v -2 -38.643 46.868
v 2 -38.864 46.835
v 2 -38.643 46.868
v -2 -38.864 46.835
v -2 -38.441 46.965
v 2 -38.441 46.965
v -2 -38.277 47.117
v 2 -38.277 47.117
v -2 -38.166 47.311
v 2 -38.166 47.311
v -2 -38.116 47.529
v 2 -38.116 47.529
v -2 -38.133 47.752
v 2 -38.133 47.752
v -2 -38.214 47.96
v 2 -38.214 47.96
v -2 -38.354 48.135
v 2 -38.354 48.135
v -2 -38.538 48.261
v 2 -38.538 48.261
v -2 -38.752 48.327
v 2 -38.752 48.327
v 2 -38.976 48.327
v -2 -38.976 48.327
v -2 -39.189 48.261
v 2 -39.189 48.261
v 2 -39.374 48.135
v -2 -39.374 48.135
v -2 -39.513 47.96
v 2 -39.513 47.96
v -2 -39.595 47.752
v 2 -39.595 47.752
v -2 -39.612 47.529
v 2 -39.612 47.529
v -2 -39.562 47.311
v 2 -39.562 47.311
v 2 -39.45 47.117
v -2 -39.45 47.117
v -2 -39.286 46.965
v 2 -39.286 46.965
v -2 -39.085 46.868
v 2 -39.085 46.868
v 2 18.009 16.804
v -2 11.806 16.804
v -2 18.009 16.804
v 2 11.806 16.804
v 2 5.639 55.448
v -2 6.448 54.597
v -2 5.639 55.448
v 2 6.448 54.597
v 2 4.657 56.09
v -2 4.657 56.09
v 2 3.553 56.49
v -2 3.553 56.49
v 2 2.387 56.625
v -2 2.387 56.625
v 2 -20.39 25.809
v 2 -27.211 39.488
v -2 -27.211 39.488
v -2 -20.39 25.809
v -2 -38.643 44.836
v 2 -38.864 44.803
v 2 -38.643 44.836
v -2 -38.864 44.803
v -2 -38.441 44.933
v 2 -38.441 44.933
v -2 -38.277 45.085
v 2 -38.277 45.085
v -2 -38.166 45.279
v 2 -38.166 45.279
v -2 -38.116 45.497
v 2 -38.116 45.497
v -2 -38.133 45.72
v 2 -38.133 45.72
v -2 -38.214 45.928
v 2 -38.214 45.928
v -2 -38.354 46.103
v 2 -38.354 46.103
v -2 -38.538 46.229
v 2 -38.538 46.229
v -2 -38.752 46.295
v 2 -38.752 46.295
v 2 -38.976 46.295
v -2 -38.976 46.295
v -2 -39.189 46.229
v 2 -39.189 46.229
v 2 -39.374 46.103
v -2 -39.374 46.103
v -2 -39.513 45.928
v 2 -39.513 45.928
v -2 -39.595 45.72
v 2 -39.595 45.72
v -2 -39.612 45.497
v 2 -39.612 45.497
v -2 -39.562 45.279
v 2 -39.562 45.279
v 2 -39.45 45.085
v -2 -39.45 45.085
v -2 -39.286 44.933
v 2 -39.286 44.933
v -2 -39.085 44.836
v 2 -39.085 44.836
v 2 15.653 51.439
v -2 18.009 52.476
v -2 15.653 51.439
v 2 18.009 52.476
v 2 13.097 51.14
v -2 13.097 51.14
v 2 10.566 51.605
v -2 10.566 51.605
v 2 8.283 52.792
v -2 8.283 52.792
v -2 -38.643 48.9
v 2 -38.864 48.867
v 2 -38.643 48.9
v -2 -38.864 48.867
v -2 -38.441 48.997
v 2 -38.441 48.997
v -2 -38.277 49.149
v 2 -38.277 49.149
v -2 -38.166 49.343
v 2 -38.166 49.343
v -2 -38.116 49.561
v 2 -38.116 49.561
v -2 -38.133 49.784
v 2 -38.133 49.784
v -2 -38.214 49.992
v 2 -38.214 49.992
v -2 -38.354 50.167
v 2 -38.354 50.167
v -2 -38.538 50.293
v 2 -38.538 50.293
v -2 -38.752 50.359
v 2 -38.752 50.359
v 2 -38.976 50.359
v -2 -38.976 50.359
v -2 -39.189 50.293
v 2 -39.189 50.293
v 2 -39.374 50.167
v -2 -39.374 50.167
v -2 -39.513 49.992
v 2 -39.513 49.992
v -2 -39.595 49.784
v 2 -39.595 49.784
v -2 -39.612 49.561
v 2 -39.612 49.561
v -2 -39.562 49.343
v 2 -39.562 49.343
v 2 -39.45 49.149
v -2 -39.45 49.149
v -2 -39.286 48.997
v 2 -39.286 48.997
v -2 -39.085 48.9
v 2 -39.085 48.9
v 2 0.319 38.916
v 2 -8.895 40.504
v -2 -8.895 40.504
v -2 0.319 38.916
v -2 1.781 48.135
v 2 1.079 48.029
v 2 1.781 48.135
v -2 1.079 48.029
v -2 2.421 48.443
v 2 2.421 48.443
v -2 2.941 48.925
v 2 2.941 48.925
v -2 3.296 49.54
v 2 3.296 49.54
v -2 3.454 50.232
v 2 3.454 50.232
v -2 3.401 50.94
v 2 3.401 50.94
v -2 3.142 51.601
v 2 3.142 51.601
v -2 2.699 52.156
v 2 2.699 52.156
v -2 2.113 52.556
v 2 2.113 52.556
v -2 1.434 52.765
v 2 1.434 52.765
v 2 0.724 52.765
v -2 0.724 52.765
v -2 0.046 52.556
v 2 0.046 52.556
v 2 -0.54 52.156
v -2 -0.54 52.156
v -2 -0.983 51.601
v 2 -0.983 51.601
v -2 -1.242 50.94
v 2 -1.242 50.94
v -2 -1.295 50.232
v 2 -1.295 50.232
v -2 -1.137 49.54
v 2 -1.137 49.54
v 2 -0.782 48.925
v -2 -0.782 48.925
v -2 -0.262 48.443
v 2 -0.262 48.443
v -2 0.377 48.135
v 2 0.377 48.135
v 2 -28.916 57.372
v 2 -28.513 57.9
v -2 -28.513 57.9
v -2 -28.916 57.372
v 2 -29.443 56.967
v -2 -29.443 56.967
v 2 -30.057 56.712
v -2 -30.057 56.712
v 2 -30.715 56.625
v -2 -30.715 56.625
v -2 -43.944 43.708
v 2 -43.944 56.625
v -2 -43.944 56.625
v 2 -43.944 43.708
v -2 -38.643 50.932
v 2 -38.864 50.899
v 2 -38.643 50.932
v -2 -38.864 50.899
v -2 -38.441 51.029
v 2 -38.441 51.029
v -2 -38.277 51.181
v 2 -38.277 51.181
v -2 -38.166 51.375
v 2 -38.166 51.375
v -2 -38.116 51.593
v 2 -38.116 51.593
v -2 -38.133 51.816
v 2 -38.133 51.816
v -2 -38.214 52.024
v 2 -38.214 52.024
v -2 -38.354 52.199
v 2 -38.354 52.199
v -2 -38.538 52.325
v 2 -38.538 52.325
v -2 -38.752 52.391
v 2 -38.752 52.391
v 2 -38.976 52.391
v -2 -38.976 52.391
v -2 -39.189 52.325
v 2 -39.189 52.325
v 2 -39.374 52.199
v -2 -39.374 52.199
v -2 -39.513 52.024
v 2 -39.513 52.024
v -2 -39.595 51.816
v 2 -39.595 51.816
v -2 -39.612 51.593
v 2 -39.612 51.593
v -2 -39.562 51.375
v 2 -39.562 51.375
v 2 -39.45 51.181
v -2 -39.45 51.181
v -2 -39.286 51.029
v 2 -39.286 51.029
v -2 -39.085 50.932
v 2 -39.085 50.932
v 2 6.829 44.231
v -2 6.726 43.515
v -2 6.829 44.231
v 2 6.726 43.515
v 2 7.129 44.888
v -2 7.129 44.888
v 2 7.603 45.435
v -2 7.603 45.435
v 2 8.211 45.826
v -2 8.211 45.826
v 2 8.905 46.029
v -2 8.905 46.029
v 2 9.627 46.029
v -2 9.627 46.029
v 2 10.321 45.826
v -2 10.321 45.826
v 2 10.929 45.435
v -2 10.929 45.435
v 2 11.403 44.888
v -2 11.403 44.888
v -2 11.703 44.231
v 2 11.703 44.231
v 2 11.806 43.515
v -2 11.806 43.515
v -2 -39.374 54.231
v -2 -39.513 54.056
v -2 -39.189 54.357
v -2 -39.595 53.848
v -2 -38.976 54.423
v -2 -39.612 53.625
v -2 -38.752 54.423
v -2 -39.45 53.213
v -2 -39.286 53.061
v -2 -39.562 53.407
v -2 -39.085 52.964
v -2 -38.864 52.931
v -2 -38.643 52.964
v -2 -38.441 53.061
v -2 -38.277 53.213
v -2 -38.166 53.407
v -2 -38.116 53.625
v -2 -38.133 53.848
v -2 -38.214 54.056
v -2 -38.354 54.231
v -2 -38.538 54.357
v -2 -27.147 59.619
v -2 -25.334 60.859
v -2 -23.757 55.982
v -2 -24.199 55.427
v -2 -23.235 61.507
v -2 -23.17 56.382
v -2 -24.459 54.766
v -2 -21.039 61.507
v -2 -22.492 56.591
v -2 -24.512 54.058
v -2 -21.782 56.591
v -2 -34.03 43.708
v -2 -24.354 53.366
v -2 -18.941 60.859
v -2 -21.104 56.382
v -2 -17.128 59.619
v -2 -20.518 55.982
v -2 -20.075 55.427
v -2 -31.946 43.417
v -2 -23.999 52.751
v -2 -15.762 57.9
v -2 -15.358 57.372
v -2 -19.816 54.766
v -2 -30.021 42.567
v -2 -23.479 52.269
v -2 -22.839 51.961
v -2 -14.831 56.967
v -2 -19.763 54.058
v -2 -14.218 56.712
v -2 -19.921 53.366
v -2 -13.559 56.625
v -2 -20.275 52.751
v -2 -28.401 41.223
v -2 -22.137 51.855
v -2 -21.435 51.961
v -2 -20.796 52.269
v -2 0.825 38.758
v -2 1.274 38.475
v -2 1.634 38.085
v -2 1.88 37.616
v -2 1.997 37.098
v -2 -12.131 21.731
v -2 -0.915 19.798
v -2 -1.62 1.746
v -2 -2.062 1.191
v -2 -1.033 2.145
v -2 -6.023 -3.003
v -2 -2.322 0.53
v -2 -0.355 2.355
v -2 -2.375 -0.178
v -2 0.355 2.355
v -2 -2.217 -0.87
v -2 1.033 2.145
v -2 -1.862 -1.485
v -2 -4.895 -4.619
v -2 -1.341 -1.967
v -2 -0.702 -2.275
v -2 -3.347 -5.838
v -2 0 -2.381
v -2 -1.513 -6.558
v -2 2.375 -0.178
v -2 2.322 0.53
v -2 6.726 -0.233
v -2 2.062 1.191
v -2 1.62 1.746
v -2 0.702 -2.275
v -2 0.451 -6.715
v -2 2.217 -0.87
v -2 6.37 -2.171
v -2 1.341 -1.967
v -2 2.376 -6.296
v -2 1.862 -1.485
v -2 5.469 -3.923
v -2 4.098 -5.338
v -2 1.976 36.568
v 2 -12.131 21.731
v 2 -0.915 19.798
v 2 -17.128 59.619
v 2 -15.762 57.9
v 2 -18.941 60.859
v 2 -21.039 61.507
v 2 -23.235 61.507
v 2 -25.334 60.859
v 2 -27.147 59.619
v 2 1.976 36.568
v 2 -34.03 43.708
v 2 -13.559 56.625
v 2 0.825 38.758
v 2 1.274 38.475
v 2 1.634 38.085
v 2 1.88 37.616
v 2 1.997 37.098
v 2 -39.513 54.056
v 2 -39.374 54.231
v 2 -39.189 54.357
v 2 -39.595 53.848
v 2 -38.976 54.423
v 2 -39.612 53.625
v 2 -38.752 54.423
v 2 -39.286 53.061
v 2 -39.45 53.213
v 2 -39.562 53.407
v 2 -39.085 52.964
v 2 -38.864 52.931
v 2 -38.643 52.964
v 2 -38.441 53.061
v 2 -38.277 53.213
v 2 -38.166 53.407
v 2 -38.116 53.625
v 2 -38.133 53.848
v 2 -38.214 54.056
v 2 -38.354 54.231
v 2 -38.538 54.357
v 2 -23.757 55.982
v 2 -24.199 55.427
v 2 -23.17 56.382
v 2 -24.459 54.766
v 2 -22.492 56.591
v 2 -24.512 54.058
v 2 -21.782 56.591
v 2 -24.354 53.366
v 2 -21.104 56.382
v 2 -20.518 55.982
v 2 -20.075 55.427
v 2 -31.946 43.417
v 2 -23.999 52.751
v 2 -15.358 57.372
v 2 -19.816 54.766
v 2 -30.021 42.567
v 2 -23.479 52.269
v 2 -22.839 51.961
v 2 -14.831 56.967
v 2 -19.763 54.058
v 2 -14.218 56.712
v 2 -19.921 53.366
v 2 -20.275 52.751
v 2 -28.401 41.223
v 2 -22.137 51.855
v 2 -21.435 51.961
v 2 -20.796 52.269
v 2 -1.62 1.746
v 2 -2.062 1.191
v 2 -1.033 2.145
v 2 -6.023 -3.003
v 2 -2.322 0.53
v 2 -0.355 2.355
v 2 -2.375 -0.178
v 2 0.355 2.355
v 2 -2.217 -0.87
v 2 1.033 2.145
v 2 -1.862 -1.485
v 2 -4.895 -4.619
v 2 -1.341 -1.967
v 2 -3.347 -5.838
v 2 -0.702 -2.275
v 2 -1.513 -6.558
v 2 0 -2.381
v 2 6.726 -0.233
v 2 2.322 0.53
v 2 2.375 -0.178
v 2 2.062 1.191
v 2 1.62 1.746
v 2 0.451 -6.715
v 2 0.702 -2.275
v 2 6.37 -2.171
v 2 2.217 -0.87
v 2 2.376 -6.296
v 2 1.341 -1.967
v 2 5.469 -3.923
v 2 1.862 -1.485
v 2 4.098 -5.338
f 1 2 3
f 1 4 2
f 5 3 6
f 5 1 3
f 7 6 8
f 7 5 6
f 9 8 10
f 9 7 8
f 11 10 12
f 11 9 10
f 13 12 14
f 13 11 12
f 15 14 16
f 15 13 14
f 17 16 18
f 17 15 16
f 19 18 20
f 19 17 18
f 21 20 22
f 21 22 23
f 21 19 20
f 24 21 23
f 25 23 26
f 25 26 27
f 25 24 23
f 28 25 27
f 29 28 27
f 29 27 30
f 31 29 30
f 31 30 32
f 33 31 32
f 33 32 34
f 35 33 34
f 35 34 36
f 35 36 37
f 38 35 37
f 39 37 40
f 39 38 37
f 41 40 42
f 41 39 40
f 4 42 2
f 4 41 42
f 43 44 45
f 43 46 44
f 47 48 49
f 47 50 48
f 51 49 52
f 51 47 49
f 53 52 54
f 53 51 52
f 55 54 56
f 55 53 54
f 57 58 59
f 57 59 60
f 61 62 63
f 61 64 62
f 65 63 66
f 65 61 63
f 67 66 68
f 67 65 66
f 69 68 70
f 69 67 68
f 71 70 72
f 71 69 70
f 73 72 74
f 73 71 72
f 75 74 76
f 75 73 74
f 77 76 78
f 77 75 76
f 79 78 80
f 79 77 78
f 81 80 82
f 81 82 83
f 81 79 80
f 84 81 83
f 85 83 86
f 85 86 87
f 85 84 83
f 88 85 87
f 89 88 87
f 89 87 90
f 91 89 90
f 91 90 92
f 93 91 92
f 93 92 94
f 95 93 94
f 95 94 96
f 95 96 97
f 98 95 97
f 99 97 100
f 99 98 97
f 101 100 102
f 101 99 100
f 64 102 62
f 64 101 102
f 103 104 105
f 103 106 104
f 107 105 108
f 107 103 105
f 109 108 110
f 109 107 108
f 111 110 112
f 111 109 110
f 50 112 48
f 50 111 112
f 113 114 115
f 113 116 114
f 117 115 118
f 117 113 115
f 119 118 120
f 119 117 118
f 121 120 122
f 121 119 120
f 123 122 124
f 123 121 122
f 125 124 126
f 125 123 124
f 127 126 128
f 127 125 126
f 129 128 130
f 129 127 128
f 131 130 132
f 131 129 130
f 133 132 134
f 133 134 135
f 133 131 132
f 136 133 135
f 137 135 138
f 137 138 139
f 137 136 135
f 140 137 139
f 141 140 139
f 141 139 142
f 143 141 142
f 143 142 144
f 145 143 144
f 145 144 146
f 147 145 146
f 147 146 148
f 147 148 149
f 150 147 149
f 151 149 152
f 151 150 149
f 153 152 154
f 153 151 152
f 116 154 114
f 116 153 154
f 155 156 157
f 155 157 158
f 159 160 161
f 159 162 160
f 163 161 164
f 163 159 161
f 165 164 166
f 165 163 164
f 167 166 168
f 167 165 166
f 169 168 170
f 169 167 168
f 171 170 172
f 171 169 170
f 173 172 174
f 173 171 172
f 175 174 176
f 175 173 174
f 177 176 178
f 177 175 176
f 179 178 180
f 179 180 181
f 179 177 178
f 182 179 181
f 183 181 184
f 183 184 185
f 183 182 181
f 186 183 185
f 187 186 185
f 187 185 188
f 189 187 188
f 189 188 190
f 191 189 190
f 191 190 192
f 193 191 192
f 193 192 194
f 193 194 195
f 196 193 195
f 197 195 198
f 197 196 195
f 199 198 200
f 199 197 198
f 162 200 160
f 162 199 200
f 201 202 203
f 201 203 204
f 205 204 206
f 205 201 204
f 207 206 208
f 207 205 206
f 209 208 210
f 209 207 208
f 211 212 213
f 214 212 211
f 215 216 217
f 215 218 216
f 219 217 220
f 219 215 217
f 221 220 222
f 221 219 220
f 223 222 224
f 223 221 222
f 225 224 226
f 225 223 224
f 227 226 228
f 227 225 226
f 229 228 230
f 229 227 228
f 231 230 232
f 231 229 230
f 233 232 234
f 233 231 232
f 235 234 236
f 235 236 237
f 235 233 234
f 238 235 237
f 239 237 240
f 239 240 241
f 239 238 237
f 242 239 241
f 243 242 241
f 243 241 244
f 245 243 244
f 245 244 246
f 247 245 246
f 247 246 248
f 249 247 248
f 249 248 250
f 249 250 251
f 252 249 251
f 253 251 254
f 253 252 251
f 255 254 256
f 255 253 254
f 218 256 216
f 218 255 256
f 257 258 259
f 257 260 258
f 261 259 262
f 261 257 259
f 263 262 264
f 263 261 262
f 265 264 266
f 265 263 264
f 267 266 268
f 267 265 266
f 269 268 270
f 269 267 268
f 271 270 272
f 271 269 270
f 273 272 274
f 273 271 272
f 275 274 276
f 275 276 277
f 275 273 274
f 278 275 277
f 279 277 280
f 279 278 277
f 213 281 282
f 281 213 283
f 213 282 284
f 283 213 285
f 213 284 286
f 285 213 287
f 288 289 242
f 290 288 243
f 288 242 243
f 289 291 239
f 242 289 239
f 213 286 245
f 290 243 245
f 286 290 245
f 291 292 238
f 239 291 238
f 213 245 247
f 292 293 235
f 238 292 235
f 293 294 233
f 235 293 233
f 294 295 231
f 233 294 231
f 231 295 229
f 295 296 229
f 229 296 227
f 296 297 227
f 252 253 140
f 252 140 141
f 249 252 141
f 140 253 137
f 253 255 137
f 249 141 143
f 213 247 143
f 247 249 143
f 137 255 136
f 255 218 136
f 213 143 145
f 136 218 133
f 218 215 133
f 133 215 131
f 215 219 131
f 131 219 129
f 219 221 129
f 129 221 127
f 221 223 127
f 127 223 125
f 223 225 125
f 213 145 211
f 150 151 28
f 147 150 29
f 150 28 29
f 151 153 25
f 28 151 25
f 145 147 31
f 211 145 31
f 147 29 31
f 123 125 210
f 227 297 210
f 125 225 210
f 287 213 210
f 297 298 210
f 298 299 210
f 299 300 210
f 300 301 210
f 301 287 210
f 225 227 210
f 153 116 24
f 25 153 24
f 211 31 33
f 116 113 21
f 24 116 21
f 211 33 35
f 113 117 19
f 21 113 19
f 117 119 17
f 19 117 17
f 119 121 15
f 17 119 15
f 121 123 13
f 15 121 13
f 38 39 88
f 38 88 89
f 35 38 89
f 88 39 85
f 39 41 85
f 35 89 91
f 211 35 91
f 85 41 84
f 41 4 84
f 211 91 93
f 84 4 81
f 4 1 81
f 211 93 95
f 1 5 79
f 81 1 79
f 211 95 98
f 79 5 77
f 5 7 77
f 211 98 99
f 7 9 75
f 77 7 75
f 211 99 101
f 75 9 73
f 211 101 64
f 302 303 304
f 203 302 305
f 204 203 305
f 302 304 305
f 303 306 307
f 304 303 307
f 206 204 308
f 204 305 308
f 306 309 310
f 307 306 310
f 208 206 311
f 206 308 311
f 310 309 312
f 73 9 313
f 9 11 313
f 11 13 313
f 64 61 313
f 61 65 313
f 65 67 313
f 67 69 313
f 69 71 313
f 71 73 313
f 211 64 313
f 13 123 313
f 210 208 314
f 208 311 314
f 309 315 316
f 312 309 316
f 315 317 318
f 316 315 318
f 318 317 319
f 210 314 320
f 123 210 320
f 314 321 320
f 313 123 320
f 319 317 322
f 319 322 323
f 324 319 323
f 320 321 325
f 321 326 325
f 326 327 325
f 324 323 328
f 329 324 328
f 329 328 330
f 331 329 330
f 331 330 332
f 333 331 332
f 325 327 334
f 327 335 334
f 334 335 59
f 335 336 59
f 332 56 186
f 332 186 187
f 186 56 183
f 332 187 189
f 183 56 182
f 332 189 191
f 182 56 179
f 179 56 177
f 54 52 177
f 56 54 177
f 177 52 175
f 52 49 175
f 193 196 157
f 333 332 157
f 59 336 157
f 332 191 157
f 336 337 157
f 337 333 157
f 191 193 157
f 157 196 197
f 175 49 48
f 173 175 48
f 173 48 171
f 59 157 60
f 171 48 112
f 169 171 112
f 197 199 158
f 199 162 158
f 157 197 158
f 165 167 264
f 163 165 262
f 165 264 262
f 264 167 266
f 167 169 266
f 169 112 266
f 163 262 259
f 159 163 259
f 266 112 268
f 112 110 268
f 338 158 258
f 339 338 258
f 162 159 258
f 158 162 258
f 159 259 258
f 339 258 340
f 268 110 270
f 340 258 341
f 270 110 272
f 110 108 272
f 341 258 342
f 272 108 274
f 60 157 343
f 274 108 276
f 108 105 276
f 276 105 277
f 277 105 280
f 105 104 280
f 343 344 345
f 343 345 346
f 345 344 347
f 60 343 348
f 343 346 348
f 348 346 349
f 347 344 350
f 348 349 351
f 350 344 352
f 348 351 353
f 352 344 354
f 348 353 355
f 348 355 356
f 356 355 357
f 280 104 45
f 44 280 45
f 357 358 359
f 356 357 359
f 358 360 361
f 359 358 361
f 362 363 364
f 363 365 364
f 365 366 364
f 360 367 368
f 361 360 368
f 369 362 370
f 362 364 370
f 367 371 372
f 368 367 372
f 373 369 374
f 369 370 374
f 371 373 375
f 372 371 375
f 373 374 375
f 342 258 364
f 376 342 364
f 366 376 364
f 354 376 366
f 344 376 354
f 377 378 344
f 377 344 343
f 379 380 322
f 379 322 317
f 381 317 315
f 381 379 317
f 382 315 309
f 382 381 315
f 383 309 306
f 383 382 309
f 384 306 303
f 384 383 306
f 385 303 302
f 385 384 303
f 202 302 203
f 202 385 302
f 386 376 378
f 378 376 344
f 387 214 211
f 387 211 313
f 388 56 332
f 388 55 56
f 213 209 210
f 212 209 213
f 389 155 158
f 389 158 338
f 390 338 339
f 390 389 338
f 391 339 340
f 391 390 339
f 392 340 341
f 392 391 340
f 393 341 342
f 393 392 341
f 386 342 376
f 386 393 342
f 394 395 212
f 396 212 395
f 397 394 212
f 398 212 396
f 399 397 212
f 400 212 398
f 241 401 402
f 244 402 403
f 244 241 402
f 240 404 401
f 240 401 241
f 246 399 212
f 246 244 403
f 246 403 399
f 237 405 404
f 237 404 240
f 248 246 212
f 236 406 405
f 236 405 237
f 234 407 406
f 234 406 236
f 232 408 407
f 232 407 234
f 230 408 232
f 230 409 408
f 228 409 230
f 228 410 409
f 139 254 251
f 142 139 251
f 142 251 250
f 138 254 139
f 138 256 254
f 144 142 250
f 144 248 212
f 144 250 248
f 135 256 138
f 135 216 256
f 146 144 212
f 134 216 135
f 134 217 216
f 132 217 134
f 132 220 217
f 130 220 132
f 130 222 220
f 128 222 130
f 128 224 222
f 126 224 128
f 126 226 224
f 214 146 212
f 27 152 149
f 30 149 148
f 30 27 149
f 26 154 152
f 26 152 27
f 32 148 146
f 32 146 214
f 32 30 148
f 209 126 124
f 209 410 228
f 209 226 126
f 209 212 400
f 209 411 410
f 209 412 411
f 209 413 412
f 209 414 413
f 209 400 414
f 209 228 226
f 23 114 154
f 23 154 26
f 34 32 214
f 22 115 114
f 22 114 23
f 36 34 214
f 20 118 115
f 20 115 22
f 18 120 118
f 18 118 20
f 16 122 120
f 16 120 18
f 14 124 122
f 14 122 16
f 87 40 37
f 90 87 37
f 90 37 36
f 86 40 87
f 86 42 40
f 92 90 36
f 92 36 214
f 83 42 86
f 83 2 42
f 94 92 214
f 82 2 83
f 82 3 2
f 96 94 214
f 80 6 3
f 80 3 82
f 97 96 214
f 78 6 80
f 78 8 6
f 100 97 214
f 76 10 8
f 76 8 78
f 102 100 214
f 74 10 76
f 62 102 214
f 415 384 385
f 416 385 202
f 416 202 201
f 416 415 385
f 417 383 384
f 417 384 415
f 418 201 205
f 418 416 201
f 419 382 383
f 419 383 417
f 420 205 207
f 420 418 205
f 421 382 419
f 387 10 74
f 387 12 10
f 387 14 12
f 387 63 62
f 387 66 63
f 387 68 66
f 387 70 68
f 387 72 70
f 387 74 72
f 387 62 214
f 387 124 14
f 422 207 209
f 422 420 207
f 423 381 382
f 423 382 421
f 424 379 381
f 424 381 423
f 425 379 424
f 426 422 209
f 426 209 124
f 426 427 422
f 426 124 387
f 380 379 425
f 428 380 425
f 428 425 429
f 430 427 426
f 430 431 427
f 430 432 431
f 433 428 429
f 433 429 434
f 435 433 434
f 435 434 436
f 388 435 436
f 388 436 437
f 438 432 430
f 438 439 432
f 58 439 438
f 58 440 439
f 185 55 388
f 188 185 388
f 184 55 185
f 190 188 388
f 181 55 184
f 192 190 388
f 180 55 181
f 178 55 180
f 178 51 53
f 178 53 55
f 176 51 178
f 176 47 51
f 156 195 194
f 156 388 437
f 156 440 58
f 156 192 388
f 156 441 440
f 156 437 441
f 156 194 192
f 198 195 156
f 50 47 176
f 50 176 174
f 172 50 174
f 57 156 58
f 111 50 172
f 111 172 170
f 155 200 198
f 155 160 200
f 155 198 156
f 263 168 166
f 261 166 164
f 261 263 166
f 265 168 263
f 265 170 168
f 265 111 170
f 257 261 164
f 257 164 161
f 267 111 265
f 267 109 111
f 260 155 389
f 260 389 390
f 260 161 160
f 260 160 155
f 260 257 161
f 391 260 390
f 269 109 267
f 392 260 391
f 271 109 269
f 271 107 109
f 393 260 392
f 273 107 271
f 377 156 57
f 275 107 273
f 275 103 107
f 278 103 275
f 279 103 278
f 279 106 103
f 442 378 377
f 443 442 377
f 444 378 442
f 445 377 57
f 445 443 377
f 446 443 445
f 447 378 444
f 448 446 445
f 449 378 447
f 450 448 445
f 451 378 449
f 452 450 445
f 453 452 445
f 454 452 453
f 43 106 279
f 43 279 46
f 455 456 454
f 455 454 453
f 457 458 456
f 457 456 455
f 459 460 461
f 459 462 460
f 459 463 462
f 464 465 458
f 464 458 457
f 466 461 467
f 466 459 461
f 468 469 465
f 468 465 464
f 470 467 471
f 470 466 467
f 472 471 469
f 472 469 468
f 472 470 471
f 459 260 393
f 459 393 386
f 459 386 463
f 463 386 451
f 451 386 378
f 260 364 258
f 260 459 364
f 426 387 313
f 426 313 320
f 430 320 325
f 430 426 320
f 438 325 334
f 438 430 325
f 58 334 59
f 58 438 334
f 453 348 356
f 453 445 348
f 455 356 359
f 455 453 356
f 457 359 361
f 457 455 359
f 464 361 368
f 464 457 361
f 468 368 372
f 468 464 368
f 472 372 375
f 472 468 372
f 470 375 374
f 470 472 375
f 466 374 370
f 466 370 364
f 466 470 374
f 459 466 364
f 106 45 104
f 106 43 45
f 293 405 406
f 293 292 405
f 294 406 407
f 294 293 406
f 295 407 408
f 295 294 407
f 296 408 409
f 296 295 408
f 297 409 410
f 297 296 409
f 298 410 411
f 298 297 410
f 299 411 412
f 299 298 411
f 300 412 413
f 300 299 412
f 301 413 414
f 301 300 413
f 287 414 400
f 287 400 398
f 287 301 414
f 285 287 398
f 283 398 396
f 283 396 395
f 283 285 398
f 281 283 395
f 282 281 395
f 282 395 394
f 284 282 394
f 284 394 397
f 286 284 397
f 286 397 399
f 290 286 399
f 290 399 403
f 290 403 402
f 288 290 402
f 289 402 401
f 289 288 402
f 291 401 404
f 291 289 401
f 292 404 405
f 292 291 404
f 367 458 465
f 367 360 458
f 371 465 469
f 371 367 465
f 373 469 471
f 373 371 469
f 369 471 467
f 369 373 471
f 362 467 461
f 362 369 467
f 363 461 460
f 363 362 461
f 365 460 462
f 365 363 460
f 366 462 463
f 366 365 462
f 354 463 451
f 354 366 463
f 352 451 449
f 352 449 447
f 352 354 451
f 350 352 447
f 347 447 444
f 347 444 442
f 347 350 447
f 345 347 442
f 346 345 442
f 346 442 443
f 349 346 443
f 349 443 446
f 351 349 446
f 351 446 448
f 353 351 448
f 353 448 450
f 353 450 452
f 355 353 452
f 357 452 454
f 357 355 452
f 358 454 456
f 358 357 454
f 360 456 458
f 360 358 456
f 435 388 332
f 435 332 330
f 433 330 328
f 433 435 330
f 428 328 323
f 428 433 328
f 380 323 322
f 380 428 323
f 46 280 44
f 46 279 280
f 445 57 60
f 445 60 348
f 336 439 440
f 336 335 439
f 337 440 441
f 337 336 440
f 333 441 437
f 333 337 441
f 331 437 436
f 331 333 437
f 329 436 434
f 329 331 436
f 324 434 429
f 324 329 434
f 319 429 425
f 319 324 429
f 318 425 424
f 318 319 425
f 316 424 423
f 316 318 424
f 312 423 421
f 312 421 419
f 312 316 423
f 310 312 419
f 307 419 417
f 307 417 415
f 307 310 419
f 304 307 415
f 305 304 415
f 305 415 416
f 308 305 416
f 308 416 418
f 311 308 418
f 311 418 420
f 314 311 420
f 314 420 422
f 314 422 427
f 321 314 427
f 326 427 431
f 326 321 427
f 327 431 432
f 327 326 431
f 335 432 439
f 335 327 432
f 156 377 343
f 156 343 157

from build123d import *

# Parameters (mm, degrees)
SKETCH1_R           = 2.38125
SKETCH1_R_2         = 0.75
BOSS_EXTRUDE1_DEPTH = 2


with BuildPart() as part:
    # Sketch1 → Boss-Extrude1 (new, symmetric)
    with BuildSketch(Plane(origin=(0, 0, 0), x_dir=(0, 0, -1), z_dir=(1, 0, 0))):
        with BuildLine():
            Line((-56.625400227, 2.386991318), (-56.625400227, -13.559221537))
            ThreePointArc((-56.625400227, -13.559221537), (-56.966991368, -14.831463057), (-57.899887224, -15.761510537))
            ThreePointArc((-57.899887224, -15.761510537), (-61.589569936, -22.137211246), (-57.899887224, -28.512911956))
            ThreePointArc((-57.899887224, -28.512911956), (-56.966991368, -29.442959435), (-56.625400227, -30.715200956))
            Line((-56.625400227, -30.715200956), (-56.625400227, -43.943749635))
            Line((-56.625400227, -43.943749635), (-43.707520647, -43.943749635))
            Line((-43.707520647, -43.943749635), (-43.707520647, -34.030414011))
            ThreePointArc((-43.707520647, -34.030414011), (-42.567322793, -30.020854914), (-39.487950002, -27.21121463))
            Line((-39.487950002, -27.21121463), (-25.808814493, -20.390042329))
            Line((-25.808814493, -20.390042329), (3.003273, -6.022744555))
            ThreePointArc((3.003273, -6.022744555), (6.576528363, 1.429116992), (0.23290188, 6.72598375))
            Line((0.23290188, 6.72598375), (-43.515144264, 6.72598375))
            ThreePointArc((-43.515144264, 6.72598375), (-46.055144264, 9.26598375), (-43.515144264, 11.80598375))
            Line((-43.515144264, 11.80598375), (-16.803992093, 11.80598375))
            Line((-16.803992093, 11.80598375), (-16.803992093, 18.009025029))
            Line((-16.803992093, 18.009025029), (-52.475776529, 18.009025029))
            ThreePointArc((-52.475776529, 18.009025029), (-51.277962728, 11.814262359), (-54.597011148, 6.44828062))
            ThreePointArc((-54.597011148, 6.44828062), (-56.090099528, 4.65681692), (-56.625400227, 2.386991318))
        make_face()
        Circle(SKETCH1_R, mode=Mode.SUBTRACT)
        with Locations((-45.553086475, -38.863749635)):
            Circle(SKETCH1_R_2, mode=Mode.SUBTRACT)
        with Locations((-47.585086475, -38.863749635)):
            Circle(SKETCH1_R_2, mode=Mode.SUBTRACT)
        with Locations((-49.617086475, -38.863749635)):
            Circle(SKETCH1_R_2, mode=Mode.SUBTRACT)
        with Locations((-51.649086475, -38.863749635)):
            Circle(SKETCH1_R_2, mode=Mode.SUBTRACT)
        with Locations((-54.236184525, -22.137211246)):
            Circle(SKETCH1_R, mode=Mode.SUBTRACT)
        with Locations((-50.410128911, 1.079375692)):
            Circle(SKETCH1_R, mode=Mode.SUBTRACT)
        with Locations((-53.681086475, -38.863749635)):
            Circle(SKETCH1_R_2, mode=Mode.SUBTRACT)
        with BuildLine():
            Line((-36.568397511, 1.976008906), (-19.797694446, -0.914638547))
            Line((-19.797694446, -0.914638547), (-21.730897843, -12.13052726))
            Line((-21.730897843, -12.13052726), (-40.504072916, -8.894727872))
            Line((-40.504072916, -8.894727872), (-38.916021454, 0.318688833))
            ThreePointArc((-38.916021454, 0.318688833), (-38.085451708, 1.633557707), (-36.568397511, 1.976008906))
        make_face(mode=Mode.SUBTRACT)
    extrude(amount=BOSS_EXTRUDE1_DEPTH, both=True)


solid = part.part
